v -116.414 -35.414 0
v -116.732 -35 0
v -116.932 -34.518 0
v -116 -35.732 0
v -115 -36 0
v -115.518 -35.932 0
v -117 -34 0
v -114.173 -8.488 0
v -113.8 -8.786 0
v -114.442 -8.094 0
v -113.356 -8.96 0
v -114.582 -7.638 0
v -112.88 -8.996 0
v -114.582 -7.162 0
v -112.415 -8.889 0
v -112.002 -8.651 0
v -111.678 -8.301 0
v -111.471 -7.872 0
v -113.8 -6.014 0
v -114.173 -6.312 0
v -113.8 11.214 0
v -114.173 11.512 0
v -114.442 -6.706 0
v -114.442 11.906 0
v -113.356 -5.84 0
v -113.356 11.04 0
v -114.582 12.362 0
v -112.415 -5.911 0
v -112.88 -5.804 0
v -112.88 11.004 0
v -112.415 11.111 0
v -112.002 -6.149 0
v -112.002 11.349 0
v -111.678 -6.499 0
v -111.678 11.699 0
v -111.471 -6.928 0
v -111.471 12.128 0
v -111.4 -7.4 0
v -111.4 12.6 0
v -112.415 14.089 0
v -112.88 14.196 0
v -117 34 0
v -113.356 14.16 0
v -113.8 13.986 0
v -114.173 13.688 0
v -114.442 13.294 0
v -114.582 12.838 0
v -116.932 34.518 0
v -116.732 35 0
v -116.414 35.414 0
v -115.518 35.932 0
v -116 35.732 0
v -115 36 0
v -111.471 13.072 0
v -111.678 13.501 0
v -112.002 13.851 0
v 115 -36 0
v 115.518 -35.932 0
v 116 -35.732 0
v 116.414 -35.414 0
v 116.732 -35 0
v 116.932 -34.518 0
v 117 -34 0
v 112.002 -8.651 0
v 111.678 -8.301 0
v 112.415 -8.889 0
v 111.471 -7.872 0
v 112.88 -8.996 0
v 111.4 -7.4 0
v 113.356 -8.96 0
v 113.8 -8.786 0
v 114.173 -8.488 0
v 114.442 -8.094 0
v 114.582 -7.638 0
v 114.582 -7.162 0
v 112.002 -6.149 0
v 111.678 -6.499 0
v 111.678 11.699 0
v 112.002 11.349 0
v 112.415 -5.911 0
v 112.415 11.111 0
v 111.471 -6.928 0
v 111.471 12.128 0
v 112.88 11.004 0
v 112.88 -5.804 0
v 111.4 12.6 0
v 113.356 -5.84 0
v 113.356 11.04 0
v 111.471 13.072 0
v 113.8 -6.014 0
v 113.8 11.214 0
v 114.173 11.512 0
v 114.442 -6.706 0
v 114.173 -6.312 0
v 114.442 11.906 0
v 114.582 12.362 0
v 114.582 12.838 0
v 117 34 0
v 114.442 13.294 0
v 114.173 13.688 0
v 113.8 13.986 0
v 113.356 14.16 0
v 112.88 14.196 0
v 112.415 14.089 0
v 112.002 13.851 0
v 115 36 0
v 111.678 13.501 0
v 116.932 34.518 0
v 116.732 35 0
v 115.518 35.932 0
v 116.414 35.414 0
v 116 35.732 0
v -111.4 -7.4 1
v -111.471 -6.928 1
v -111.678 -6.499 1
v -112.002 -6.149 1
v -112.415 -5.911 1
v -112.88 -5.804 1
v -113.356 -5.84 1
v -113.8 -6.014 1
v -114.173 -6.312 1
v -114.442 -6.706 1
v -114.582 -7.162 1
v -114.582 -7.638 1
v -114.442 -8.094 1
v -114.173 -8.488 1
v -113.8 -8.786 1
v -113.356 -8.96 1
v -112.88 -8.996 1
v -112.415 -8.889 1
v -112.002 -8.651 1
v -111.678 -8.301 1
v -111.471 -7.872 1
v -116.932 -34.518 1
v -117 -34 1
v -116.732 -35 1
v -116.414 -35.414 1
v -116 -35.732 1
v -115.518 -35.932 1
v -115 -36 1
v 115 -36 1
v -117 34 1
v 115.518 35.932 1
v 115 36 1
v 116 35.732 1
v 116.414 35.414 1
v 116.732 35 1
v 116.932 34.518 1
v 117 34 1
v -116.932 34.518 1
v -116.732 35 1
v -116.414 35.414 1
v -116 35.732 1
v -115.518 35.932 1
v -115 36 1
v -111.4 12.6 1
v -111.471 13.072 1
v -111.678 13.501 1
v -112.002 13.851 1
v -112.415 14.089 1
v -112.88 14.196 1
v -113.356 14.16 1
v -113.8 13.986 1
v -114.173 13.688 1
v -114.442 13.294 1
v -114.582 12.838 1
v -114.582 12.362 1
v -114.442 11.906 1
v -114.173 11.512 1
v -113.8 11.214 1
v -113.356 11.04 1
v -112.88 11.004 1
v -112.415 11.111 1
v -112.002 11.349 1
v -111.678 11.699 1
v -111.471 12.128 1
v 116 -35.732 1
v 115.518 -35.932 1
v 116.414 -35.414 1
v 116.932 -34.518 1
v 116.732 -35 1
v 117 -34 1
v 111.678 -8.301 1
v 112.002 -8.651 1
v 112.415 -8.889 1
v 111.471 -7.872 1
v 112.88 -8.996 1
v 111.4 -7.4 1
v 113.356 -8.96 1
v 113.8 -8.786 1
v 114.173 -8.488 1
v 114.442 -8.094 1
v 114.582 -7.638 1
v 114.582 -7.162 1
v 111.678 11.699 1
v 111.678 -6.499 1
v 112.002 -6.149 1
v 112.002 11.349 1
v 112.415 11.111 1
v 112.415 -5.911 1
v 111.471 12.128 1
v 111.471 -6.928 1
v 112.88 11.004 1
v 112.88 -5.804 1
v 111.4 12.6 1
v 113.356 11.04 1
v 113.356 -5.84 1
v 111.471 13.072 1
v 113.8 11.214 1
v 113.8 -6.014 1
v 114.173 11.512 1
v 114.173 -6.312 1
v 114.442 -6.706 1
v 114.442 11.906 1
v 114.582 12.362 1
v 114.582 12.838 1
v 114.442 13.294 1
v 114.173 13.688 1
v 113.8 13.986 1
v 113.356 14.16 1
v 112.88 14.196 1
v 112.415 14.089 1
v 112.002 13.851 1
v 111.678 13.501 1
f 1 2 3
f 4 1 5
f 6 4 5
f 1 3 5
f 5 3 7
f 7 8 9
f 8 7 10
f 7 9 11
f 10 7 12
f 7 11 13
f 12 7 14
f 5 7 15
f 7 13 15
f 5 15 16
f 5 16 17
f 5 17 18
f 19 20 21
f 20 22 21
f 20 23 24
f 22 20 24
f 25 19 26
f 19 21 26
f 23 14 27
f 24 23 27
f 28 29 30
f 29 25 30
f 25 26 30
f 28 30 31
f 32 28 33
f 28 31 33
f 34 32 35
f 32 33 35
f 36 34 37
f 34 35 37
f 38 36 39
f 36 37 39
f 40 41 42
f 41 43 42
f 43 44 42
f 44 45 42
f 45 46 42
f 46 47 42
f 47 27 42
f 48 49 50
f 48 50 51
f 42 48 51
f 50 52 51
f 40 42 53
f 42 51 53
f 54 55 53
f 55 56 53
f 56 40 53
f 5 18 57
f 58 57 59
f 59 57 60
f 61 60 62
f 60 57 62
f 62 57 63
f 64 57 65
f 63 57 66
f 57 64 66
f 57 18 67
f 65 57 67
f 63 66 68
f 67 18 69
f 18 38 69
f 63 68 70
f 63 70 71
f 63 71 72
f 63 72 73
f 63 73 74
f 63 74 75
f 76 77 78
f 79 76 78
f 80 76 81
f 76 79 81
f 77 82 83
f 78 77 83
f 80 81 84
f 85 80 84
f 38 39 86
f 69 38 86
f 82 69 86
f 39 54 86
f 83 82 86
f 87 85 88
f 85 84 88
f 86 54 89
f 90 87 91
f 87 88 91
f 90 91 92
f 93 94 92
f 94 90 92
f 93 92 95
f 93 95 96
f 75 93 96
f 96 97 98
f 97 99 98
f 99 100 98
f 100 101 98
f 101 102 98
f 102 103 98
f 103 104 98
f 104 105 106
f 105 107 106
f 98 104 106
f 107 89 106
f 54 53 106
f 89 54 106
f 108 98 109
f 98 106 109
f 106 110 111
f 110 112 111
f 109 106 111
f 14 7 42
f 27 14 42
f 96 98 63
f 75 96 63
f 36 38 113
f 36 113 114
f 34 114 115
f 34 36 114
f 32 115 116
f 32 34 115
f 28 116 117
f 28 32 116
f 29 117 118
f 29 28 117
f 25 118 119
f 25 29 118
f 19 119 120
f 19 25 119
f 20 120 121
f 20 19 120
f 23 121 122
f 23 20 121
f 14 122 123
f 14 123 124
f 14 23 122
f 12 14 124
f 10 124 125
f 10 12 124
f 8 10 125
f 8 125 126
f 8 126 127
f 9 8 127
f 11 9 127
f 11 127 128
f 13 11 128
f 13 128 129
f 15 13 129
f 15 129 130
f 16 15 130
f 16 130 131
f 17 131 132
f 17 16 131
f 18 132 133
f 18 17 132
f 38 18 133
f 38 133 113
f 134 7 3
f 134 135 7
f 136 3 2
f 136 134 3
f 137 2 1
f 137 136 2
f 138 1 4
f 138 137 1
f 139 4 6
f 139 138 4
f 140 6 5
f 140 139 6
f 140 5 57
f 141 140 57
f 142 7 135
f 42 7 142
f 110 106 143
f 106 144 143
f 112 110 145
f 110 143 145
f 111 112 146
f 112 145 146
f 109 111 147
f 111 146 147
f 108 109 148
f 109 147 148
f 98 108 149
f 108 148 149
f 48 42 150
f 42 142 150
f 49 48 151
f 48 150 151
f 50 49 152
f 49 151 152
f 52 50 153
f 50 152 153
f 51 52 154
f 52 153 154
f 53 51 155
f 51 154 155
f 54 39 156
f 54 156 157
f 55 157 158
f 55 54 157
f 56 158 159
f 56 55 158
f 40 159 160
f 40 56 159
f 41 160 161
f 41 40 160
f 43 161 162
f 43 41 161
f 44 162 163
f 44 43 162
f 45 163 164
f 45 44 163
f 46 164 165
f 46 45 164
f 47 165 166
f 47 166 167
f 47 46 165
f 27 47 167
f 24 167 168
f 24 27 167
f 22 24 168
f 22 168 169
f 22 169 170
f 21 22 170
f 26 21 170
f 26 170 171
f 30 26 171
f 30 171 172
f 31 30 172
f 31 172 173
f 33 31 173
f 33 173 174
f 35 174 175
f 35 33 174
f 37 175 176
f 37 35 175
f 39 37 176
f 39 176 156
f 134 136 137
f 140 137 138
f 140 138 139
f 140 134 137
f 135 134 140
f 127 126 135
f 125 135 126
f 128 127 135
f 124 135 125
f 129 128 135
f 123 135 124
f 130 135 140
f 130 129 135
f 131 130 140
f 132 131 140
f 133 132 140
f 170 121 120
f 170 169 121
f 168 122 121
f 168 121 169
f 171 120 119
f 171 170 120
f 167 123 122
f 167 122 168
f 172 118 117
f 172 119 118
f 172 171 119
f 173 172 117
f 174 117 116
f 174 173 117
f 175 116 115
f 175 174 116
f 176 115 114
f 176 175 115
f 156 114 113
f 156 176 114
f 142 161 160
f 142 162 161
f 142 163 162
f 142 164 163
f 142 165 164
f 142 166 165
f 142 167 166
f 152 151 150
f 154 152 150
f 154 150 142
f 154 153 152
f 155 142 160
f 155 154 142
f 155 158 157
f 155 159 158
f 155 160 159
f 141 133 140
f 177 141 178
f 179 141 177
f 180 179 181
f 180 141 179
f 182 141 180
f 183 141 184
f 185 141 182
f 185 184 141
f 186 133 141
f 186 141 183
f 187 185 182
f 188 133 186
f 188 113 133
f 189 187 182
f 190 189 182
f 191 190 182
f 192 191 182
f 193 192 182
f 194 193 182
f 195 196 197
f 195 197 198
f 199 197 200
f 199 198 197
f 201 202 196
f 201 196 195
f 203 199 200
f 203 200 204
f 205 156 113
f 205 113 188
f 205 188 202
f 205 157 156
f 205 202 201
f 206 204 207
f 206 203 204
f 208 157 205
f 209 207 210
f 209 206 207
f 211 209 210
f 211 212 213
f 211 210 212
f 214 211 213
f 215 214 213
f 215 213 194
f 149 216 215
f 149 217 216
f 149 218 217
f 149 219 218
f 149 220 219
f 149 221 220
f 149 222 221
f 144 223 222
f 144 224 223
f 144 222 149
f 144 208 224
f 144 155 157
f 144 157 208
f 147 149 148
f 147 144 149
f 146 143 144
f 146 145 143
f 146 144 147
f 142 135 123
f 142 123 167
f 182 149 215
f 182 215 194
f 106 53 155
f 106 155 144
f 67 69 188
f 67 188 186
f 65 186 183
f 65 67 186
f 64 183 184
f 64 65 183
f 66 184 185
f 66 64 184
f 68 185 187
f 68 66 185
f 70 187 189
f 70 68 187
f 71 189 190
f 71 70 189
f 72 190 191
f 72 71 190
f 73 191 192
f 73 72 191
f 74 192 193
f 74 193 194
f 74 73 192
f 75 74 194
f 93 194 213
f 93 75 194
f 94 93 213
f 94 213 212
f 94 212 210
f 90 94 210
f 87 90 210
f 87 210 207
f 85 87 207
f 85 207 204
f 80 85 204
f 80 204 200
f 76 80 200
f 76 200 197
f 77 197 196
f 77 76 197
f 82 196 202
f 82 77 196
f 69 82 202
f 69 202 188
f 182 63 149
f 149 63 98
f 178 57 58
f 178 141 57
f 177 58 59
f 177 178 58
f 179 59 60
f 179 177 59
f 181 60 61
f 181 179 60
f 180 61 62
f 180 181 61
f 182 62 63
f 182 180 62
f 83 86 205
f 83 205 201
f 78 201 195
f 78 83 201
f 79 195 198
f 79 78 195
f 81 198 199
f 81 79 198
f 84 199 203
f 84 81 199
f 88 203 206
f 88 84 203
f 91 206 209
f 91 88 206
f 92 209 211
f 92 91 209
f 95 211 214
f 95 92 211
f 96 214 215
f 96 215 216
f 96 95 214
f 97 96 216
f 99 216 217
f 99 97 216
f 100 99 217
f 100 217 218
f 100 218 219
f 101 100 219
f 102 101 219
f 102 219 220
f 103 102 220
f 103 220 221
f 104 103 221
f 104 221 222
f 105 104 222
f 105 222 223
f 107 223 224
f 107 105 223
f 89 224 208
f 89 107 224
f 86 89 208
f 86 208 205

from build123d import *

# Parameters (mm, degrees)
SKETCH_1_W      = 234
SKETCH_1_H      = 72
SKETCH_1_R      = 1.6
EXTRUDE_1_DEPTH = 1
FILLET_1_R      = 2


with BuildPart() as part:
    # 草图1 → 凸台-拉伸1 (new body)
    with BuildSketch(Plane.XY):
        Rectangle(SKETCH_1_W, SKETCH_1_H)
        with Locations((-113, 12.6)):
            Circle(SKETCH_1_R, mode=Mode.SUBTRACT)
        with Locations((-113, -7.4)):
            Circle(SKETCH_1_R, mode=Mode.SUBTRACT)
        with Locations(Location((113, -7.4, 0), (0, 0, 180))):
            Circle(SKETCH_1_R, mode=Mode.SUBTRACT)
        with Locations(Location((113, 12.6, 0), (0, 0, 180))):
            Circle(SKETCH_1_R, mode=Mode.SUBTRACT)
    extrude(amount=EXTRUDE_1_DEPTH)

    # 圆角1
    fillet_1_edges = [part.edges().sort_by_distance(p)[0] for p in [
        (117, -36, 0.5),
        (-117, -36, 0.5),
        (-117, 36, 0.5),
        (117, 36, 0.5),
    ]]
    fillet(fillet_1_edges, radius=FILLET_1_R)


solid = part.part
